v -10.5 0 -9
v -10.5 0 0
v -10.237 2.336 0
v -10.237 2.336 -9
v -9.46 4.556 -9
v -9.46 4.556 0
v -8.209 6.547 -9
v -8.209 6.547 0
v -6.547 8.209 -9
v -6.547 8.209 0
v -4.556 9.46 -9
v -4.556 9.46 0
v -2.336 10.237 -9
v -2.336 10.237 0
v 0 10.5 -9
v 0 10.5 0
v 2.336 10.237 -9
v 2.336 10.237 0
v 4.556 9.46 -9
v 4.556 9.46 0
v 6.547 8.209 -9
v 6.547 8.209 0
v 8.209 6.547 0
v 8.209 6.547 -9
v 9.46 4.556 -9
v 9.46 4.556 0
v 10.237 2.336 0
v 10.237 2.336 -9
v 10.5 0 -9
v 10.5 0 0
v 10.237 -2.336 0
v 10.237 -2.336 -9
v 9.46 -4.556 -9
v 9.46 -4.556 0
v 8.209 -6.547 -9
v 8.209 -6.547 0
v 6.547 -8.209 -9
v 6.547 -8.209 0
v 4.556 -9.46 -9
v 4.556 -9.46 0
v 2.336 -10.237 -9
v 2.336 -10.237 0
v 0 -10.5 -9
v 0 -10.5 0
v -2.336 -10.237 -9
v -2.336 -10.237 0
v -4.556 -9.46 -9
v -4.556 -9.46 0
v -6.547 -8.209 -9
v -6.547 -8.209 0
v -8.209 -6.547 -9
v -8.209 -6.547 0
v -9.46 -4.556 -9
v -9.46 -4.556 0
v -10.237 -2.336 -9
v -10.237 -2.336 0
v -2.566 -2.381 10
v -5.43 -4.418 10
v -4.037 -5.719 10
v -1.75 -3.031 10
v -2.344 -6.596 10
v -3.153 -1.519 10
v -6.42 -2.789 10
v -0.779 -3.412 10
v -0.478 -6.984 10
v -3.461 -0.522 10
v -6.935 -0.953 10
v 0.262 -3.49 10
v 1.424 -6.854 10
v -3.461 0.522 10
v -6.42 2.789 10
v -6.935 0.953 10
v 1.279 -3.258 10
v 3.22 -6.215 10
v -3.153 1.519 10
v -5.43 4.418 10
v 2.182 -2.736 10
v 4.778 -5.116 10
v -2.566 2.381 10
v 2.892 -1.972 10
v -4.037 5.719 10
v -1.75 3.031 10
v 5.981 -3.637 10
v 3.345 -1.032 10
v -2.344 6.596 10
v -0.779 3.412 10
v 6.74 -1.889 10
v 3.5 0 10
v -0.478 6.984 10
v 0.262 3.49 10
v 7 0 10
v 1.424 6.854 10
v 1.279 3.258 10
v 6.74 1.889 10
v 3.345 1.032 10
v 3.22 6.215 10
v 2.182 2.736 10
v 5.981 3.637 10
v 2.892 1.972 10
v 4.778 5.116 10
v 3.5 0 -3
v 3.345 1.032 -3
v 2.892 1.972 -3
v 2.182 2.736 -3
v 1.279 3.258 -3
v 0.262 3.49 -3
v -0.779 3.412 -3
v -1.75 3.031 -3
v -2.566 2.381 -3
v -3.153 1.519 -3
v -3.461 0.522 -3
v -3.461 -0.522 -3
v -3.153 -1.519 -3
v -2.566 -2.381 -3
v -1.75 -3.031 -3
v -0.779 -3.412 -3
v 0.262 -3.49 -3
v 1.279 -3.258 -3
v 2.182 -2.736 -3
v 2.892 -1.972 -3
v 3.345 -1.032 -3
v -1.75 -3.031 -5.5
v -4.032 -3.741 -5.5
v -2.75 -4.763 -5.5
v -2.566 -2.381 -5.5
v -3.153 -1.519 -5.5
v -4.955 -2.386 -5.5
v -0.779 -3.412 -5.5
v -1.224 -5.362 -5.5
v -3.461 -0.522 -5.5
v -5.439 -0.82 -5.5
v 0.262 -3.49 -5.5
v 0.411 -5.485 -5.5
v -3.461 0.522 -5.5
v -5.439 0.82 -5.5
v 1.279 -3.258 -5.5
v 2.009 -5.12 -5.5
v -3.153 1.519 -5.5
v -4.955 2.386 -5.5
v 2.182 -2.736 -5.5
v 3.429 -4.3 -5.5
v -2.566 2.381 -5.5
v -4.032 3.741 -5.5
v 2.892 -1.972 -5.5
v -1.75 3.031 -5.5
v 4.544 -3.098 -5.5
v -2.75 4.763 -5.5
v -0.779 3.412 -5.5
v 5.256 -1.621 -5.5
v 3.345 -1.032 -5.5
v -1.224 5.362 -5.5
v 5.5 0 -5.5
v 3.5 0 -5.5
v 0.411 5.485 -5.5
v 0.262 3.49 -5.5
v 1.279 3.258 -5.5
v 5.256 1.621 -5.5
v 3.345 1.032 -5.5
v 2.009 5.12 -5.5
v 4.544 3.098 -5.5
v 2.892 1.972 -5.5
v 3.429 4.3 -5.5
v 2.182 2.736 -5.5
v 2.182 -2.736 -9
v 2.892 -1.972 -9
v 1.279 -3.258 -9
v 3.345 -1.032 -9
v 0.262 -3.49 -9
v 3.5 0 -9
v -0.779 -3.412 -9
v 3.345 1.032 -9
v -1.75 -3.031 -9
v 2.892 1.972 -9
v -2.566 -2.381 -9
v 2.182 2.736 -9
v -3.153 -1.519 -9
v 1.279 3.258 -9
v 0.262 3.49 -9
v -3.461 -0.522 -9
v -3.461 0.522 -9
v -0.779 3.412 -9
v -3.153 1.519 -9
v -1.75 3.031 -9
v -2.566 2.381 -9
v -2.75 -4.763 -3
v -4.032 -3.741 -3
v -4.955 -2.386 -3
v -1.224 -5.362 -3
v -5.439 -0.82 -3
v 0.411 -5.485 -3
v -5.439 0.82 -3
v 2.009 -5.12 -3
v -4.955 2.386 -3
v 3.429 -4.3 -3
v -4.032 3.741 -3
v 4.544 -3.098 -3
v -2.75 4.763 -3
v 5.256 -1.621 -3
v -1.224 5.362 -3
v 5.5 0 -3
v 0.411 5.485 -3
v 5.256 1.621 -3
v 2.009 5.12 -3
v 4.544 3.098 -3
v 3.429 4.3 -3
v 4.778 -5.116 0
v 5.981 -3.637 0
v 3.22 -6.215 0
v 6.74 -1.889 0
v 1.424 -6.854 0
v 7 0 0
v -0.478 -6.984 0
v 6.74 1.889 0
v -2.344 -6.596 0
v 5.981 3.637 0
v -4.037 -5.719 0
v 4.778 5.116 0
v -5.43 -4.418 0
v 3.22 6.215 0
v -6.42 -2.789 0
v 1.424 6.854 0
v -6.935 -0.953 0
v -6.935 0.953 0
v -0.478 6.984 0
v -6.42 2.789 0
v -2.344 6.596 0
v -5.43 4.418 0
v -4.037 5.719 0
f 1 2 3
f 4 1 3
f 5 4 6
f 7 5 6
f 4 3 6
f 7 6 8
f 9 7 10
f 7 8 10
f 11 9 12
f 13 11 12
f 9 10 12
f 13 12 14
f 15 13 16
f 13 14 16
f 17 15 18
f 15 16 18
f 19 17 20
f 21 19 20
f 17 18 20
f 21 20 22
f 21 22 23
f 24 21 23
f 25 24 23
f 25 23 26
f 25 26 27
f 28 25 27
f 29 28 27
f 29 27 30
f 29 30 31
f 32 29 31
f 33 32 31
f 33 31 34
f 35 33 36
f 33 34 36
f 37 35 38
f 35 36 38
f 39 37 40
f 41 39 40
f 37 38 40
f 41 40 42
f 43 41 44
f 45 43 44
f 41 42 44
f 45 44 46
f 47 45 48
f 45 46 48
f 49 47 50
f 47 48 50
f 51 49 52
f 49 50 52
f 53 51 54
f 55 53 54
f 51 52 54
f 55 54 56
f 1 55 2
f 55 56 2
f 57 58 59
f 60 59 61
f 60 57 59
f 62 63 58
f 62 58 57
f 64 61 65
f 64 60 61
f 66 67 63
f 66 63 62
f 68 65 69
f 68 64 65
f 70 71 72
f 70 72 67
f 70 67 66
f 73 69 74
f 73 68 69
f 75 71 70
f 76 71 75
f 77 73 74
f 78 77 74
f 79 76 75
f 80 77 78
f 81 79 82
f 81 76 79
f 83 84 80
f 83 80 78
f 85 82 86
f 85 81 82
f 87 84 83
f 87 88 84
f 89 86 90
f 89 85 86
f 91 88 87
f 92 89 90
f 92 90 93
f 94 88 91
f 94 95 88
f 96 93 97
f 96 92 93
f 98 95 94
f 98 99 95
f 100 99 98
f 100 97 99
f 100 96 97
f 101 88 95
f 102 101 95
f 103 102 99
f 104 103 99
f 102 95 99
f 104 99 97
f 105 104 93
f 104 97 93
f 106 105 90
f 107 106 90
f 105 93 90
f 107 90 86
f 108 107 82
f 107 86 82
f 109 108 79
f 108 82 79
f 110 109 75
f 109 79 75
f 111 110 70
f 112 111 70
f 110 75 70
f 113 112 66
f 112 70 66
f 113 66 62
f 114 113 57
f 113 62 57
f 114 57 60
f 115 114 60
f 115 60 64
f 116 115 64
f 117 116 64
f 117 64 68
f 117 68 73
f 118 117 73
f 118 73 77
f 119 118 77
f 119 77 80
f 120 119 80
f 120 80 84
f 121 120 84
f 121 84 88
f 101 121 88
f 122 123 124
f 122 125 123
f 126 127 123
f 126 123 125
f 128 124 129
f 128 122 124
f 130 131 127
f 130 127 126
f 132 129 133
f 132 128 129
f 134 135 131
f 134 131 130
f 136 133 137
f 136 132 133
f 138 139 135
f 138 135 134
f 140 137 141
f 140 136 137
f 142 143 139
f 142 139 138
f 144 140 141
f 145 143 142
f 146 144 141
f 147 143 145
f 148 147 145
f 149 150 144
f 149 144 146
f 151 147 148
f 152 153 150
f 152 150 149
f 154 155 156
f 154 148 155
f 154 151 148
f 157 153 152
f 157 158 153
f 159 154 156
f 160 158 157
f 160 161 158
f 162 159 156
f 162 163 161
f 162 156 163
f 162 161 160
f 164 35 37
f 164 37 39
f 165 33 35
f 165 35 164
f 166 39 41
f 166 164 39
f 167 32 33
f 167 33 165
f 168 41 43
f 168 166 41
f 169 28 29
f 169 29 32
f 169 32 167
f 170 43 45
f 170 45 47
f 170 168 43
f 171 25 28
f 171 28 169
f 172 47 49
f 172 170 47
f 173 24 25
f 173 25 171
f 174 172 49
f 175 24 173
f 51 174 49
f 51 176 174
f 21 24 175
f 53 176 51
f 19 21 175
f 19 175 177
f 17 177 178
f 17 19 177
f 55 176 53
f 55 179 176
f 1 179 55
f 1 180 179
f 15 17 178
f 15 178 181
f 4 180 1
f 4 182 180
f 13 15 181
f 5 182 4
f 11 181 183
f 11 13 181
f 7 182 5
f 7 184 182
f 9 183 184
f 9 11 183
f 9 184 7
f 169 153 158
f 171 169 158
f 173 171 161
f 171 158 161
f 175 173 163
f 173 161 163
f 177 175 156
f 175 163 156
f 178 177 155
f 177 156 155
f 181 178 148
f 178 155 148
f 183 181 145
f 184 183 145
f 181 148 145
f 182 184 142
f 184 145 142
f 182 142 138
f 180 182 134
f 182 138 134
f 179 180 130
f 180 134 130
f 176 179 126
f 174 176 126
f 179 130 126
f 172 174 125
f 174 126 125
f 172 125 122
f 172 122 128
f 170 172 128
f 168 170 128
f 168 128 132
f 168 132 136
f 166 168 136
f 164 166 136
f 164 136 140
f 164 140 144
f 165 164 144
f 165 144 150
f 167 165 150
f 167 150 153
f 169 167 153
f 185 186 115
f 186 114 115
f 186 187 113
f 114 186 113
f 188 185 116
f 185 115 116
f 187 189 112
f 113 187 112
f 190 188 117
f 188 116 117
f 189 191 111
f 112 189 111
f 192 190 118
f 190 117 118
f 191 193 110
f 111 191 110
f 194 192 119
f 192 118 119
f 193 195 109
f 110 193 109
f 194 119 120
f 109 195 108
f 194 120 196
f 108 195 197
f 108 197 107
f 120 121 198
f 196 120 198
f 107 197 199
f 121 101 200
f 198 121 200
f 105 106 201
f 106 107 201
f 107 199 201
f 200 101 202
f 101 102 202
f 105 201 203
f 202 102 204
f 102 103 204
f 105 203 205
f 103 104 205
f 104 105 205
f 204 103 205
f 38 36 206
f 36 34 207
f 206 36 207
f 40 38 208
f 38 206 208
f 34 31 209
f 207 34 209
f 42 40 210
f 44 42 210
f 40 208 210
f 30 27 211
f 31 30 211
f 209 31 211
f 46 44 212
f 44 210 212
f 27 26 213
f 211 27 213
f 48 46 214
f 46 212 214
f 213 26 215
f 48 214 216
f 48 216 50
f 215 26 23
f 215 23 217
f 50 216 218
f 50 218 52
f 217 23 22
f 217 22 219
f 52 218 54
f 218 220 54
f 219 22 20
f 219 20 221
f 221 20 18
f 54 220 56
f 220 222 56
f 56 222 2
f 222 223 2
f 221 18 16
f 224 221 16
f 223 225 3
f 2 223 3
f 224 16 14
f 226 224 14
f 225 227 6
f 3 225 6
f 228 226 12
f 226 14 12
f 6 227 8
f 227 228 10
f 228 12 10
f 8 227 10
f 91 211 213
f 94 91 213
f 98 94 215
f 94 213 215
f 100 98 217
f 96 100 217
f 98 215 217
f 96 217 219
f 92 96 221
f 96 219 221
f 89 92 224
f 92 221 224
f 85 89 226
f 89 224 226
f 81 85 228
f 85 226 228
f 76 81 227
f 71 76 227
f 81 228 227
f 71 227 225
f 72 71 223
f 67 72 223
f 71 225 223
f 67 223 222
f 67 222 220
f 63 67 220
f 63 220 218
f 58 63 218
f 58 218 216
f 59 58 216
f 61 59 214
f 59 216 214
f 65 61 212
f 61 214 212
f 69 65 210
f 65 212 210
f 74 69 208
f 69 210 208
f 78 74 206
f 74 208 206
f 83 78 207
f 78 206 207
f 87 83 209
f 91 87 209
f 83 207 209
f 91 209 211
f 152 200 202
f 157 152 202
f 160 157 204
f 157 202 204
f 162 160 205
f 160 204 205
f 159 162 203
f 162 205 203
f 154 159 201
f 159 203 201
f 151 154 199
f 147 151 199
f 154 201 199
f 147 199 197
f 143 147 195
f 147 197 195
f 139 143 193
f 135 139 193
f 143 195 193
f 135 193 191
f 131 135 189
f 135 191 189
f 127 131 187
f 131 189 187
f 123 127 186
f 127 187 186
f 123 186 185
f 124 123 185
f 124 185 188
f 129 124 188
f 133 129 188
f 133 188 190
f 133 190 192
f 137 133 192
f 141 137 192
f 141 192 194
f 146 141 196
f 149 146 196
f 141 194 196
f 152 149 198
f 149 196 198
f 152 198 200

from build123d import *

# Parameters (mm, degrees)
SKETCH_2_R          = 7
EXTRUDE_1_DEPTH     = 10
SKETCH_3_R          = 10.5
EXTRUDE_2_DEPTH     = 9
SKETCH_4_R          = 3.5
CUT_EXTRUDE_1_DEPTH = 25.114311104
CUT_EXTRUDE_START   = -13
SKETCH_5_R          = 5.5
CUT_EXTRUDE_2_DEPTH = 2.5


with BuildPart() as part:
    # Эскиз2 → Бобышка-Вытянуть1 (new body)
    with BuildSketch(Plane.XY):
        Circle(SKETCH_2_R)
    extrude(amount=EXTRUDE_1_DEPTH)

    # Эскиз3 → Бобышка-Вытянуть2 (add)
    with BuildSketch(Plane(origin=(0, 0, 0), x_dir=(-1, 0, 0), z_dir=(0, 0, -1))):
        Circle(SKETCH_3_R)
    extrude(amount=EXTRUDE_2_DEPTH)

    # Эскиз4 → Вырез-Вытянуть1 (cut, through all)
    with BuildSketch(Plane.XY.offset(10)):
        Circle(SKETCH_4_R)
    extrude(amount=-CUT_EXTRUDE_1_DEPTH, mode=Mode.SUBTRACT)

    # Эскиз5 → Вырез-Вытянуть2 (cut)
    with BuildSketch(Plane.XY.offset(10).offset(CUT_EXTRUDE_START)):
        Circle(SKETCH_5_R)
    extrude(amount=-CUT_EXTRUDE_2_DEPTH, mode=Mode.SUBTRACT)


solid = part.part
